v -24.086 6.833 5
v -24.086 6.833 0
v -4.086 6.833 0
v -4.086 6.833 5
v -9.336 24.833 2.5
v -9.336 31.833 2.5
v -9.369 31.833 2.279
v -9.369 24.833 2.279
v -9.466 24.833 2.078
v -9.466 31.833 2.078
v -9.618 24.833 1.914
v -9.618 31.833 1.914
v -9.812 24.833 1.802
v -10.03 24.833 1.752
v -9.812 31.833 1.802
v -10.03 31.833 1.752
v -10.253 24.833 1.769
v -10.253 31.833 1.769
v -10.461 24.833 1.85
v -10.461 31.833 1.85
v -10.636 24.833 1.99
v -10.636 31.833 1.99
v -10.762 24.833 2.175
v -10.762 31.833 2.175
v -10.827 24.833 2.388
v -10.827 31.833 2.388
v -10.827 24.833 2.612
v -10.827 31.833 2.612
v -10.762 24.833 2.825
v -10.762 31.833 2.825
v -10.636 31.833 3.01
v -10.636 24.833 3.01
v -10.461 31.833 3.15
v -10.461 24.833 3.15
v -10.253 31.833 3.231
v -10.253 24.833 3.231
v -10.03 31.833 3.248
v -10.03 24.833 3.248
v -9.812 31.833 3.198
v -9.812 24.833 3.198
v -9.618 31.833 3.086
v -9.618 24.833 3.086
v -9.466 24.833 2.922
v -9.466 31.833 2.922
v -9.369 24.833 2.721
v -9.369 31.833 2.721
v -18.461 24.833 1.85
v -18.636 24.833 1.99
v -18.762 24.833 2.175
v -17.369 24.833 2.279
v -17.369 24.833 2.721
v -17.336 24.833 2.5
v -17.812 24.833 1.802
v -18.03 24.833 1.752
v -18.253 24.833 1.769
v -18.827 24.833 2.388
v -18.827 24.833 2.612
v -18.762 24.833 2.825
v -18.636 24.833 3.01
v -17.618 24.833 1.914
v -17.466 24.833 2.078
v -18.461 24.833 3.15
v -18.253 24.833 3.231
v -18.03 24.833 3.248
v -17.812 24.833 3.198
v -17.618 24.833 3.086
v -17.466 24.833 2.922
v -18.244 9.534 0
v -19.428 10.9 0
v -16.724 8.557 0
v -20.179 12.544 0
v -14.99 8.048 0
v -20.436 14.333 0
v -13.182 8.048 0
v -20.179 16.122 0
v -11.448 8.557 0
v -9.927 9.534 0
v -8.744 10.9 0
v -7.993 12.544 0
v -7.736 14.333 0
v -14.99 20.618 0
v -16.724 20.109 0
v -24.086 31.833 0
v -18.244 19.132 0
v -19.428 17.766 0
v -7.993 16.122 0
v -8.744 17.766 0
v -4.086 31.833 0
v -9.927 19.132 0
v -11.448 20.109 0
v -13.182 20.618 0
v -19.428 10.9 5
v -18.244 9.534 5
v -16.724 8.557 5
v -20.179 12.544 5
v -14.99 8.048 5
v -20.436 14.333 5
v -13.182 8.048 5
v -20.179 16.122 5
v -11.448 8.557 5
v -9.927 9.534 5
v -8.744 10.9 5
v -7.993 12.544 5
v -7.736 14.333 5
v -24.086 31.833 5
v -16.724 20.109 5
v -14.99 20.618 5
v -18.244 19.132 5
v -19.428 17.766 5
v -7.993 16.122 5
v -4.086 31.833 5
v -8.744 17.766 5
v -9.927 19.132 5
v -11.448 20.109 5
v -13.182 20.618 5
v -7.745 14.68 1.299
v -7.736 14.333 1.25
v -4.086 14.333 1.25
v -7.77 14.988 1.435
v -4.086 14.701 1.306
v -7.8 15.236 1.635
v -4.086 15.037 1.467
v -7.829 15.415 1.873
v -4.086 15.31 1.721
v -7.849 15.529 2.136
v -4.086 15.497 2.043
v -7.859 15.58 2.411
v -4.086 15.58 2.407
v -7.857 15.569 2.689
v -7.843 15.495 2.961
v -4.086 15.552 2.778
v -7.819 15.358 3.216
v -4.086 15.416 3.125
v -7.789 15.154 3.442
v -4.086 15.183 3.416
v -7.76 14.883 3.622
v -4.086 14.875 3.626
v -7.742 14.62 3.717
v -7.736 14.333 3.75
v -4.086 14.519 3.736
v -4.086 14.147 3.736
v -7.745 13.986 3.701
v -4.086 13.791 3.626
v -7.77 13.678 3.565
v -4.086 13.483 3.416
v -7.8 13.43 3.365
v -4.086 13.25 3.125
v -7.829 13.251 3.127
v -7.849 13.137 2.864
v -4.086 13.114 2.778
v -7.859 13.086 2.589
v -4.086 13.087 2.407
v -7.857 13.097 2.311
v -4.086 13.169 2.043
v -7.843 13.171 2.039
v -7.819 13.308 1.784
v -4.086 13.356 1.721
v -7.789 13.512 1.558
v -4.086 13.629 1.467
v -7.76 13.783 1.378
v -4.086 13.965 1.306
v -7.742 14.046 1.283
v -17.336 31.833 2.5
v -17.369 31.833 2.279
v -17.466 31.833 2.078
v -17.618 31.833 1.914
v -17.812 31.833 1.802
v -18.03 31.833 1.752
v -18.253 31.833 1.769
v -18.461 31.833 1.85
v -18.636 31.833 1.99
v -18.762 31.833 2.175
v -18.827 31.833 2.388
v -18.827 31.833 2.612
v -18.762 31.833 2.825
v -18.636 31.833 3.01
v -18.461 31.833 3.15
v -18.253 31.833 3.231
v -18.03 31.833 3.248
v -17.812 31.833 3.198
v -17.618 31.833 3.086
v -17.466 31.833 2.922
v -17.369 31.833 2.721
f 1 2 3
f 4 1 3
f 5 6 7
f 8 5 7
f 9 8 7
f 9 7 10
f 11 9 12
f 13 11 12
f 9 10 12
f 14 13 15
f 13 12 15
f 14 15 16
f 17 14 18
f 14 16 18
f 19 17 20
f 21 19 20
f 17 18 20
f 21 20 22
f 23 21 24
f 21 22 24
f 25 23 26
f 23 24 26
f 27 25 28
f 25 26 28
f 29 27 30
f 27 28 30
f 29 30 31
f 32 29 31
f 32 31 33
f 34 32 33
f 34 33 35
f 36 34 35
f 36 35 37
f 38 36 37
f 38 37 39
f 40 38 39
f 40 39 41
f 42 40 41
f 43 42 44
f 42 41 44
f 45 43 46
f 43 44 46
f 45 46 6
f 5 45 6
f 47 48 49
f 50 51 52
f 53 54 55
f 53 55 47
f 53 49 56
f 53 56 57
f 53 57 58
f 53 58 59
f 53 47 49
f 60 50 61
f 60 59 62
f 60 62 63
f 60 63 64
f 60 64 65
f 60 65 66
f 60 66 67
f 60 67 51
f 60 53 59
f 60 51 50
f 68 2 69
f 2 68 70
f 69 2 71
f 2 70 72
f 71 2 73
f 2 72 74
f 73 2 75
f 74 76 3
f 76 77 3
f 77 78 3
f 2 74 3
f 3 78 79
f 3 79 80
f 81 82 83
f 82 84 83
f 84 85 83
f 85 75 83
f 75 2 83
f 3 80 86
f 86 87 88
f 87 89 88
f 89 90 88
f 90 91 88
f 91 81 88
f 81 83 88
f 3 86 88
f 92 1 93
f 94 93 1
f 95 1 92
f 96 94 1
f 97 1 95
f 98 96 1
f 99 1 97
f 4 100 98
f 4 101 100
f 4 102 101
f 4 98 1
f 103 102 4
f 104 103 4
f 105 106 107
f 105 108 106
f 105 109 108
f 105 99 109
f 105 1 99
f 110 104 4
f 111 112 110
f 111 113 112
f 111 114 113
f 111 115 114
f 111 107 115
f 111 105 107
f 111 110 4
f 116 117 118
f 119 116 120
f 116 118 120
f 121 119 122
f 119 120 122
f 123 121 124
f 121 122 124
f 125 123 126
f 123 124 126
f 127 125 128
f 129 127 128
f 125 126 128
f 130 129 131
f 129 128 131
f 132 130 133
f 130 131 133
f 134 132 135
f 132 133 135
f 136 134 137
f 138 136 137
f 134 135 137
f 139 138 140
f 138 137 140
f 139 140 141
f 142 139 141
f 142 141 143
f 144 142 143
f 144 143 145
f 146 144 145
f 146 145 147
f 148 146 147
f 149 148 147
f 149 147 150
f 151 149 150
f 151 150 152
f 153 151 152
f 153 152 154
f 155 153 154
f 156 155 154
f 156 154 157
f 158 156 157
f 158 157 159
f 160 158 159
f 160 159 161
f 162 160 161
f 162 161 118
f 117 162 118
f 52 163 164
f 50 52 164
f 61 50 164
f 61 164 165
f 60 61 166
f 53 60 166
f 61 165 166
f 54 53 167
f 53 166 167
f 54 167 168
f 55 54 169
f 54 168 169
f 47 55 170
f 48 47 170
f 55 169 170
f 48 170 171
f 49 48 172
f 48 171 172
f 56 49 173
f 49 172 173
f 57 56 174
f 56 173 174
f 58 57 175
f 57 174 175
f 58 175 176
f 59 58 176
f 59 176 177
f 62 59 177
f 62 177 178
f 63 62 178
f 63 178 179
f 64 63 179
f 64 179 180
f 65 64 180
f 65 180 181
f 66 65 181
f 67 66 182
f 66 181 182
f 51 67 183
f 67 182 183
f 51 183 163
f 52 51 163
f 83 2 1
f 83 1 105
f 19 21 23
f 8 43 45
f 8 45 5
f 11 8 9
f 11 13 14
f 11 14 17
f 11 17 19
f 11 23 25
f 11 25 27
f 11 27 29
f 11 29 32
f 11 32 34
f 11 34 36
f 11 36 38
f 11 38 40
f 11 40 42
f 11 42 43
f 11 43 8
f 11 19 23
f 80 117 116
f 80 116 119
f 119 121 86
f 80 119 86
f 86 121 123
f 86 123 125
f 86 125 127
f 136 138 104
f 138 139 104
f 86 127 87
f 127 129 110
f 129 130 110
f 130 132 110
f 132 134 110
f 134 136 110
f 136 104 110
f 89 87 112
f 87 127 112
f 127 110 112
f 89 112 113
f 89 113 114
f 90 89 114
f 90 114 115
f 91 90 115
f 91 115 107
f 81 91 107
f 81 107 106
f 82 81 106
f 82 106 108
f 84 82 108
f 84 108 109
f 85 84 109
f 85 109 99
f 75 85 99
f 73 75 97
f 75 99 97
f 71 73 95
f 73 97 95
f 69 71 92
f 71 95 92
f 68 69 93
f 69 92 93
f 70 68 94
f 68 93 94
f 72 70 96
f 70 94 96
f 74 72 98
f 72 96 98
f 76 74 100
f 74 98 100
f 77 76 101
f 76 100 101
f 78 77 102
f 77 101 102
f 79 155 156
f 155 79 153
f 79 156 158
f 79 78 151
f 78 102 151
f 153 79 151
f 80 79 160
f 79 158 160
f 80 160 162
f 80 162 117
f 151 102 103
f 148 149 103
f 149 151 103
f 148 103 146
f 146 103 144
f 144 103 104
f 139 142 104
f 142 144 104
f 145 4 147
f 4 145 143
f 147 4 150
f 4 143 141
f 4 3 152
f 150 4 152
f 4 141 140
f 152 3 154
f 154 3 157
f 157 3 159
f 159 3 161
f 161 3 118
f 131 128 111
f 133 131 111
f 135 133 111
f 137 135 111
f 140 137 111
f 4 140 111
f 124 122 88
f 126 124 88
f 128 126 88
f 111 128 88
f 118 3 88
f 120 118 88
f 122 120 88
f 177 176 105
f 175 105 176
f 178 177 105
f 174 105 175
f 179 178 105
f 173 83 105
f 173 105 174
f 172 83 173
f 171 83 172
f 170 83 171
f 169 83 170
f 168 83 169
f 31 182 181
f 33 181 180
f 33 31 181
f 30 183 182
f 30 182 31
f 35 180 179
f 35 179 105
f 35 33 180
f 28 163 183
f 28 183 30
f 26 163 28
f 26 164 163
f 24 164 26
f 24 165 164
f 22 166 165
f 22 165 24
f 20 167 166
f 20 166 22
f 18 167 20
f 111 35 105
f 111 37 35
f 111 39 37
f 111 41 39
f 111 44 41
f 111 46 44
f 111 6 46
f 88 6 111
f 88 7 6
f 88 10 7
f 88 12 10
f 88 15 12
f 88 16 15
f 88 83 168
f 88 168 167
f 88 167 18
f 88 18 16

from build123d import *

# Parameters (mm, degrees)
SKETCH1_W           = 20
SKETCH1_H           = 25
BOSS_EXTRUDE1_DEPTH = 5
CUT_EXTRUDE1_REACH  = 7
SKETCH3_R           = 6.35
SKETCH5_R           = 0.75
CUT_EXTRUDE2_DEPTH  = 7
CUT_EXTRUDE3_REACH  = 22
SKETCH6_R           = 1.25


with BuildPart() as part:
    # Sketch1 → Boss-Extrude1 (new body)
    with BuildSketch(Plane.XY):
        with Locations((-14.085851727, 19.333014081)):
            Rectangle(SKETCH1_W, SKETCH1_H)
    extrude(amount=BOSS_EXTRUDE1_DEPTH)

    # Sketch3 → Cut-Extrude1 (cut, up to next)
    with BuildSketch(Plane.XY.offset(5), mode=Mode.PRIVATE) as cut_extrude1_sk1:
        with Locations((-14.085851727, 14.333014081)):
            Circle(SKETCH3_R)
    cut_extrude1_tool1 = extrude(cut_extrude1_sk1.sketch, amount=-CUT_EXTRUDE1_REACH, mode=Mode.PRIVATE) & part.part
    add(cut_extrude1_tool1.solids().sort_by_distance((-14.085852, 14.333014, 5))[0], mode=Mode.SUBTRACT)

    # Sketch5 → Cut-Extrude2 (cut)
    with BuildSketch(Plane(origin=(0, 31.833014081, 0), x_dir=(1, 0, 0), z_dir=(0, 1, 0))):
        with Locations((-10.085851727, -2.5)):
            Circle(SKETCH5_R)
        with Locations((-18.085851727, -2.5)):
            Circle(SKETCH5_R)
    extrude(amount=-CUT_EXTRUDE2_DEPTH, mode=Mode.SUBTRACT)

    # Sketch6 → Cut-Extrude3 (cut, up to next)
    with BuildSketch(Plane(origin=(-4.085851727, 0, 0), x_dir=(0, 0, -1), z_dir=(1, 0, 0)), mode=Mode.PRIVATE) as cut_extrude3_sk1:
        with Locations((-2.5, 14.333014081)):
            Circle(SKETCH6_R)
    cut_extrude3_tool1 = extrude(cut_extrude3_sk1.sketch, amount=-CUT_EXTRUDE3_REACH, mode=Mode.PRIVATE) & part.part
    add(cut_extrude3_tool1.solids().sort_by_distance((-4.085852, 14.333014, 2.5))[0], mode=Mode.SUBTRACT)


solid = part.part
